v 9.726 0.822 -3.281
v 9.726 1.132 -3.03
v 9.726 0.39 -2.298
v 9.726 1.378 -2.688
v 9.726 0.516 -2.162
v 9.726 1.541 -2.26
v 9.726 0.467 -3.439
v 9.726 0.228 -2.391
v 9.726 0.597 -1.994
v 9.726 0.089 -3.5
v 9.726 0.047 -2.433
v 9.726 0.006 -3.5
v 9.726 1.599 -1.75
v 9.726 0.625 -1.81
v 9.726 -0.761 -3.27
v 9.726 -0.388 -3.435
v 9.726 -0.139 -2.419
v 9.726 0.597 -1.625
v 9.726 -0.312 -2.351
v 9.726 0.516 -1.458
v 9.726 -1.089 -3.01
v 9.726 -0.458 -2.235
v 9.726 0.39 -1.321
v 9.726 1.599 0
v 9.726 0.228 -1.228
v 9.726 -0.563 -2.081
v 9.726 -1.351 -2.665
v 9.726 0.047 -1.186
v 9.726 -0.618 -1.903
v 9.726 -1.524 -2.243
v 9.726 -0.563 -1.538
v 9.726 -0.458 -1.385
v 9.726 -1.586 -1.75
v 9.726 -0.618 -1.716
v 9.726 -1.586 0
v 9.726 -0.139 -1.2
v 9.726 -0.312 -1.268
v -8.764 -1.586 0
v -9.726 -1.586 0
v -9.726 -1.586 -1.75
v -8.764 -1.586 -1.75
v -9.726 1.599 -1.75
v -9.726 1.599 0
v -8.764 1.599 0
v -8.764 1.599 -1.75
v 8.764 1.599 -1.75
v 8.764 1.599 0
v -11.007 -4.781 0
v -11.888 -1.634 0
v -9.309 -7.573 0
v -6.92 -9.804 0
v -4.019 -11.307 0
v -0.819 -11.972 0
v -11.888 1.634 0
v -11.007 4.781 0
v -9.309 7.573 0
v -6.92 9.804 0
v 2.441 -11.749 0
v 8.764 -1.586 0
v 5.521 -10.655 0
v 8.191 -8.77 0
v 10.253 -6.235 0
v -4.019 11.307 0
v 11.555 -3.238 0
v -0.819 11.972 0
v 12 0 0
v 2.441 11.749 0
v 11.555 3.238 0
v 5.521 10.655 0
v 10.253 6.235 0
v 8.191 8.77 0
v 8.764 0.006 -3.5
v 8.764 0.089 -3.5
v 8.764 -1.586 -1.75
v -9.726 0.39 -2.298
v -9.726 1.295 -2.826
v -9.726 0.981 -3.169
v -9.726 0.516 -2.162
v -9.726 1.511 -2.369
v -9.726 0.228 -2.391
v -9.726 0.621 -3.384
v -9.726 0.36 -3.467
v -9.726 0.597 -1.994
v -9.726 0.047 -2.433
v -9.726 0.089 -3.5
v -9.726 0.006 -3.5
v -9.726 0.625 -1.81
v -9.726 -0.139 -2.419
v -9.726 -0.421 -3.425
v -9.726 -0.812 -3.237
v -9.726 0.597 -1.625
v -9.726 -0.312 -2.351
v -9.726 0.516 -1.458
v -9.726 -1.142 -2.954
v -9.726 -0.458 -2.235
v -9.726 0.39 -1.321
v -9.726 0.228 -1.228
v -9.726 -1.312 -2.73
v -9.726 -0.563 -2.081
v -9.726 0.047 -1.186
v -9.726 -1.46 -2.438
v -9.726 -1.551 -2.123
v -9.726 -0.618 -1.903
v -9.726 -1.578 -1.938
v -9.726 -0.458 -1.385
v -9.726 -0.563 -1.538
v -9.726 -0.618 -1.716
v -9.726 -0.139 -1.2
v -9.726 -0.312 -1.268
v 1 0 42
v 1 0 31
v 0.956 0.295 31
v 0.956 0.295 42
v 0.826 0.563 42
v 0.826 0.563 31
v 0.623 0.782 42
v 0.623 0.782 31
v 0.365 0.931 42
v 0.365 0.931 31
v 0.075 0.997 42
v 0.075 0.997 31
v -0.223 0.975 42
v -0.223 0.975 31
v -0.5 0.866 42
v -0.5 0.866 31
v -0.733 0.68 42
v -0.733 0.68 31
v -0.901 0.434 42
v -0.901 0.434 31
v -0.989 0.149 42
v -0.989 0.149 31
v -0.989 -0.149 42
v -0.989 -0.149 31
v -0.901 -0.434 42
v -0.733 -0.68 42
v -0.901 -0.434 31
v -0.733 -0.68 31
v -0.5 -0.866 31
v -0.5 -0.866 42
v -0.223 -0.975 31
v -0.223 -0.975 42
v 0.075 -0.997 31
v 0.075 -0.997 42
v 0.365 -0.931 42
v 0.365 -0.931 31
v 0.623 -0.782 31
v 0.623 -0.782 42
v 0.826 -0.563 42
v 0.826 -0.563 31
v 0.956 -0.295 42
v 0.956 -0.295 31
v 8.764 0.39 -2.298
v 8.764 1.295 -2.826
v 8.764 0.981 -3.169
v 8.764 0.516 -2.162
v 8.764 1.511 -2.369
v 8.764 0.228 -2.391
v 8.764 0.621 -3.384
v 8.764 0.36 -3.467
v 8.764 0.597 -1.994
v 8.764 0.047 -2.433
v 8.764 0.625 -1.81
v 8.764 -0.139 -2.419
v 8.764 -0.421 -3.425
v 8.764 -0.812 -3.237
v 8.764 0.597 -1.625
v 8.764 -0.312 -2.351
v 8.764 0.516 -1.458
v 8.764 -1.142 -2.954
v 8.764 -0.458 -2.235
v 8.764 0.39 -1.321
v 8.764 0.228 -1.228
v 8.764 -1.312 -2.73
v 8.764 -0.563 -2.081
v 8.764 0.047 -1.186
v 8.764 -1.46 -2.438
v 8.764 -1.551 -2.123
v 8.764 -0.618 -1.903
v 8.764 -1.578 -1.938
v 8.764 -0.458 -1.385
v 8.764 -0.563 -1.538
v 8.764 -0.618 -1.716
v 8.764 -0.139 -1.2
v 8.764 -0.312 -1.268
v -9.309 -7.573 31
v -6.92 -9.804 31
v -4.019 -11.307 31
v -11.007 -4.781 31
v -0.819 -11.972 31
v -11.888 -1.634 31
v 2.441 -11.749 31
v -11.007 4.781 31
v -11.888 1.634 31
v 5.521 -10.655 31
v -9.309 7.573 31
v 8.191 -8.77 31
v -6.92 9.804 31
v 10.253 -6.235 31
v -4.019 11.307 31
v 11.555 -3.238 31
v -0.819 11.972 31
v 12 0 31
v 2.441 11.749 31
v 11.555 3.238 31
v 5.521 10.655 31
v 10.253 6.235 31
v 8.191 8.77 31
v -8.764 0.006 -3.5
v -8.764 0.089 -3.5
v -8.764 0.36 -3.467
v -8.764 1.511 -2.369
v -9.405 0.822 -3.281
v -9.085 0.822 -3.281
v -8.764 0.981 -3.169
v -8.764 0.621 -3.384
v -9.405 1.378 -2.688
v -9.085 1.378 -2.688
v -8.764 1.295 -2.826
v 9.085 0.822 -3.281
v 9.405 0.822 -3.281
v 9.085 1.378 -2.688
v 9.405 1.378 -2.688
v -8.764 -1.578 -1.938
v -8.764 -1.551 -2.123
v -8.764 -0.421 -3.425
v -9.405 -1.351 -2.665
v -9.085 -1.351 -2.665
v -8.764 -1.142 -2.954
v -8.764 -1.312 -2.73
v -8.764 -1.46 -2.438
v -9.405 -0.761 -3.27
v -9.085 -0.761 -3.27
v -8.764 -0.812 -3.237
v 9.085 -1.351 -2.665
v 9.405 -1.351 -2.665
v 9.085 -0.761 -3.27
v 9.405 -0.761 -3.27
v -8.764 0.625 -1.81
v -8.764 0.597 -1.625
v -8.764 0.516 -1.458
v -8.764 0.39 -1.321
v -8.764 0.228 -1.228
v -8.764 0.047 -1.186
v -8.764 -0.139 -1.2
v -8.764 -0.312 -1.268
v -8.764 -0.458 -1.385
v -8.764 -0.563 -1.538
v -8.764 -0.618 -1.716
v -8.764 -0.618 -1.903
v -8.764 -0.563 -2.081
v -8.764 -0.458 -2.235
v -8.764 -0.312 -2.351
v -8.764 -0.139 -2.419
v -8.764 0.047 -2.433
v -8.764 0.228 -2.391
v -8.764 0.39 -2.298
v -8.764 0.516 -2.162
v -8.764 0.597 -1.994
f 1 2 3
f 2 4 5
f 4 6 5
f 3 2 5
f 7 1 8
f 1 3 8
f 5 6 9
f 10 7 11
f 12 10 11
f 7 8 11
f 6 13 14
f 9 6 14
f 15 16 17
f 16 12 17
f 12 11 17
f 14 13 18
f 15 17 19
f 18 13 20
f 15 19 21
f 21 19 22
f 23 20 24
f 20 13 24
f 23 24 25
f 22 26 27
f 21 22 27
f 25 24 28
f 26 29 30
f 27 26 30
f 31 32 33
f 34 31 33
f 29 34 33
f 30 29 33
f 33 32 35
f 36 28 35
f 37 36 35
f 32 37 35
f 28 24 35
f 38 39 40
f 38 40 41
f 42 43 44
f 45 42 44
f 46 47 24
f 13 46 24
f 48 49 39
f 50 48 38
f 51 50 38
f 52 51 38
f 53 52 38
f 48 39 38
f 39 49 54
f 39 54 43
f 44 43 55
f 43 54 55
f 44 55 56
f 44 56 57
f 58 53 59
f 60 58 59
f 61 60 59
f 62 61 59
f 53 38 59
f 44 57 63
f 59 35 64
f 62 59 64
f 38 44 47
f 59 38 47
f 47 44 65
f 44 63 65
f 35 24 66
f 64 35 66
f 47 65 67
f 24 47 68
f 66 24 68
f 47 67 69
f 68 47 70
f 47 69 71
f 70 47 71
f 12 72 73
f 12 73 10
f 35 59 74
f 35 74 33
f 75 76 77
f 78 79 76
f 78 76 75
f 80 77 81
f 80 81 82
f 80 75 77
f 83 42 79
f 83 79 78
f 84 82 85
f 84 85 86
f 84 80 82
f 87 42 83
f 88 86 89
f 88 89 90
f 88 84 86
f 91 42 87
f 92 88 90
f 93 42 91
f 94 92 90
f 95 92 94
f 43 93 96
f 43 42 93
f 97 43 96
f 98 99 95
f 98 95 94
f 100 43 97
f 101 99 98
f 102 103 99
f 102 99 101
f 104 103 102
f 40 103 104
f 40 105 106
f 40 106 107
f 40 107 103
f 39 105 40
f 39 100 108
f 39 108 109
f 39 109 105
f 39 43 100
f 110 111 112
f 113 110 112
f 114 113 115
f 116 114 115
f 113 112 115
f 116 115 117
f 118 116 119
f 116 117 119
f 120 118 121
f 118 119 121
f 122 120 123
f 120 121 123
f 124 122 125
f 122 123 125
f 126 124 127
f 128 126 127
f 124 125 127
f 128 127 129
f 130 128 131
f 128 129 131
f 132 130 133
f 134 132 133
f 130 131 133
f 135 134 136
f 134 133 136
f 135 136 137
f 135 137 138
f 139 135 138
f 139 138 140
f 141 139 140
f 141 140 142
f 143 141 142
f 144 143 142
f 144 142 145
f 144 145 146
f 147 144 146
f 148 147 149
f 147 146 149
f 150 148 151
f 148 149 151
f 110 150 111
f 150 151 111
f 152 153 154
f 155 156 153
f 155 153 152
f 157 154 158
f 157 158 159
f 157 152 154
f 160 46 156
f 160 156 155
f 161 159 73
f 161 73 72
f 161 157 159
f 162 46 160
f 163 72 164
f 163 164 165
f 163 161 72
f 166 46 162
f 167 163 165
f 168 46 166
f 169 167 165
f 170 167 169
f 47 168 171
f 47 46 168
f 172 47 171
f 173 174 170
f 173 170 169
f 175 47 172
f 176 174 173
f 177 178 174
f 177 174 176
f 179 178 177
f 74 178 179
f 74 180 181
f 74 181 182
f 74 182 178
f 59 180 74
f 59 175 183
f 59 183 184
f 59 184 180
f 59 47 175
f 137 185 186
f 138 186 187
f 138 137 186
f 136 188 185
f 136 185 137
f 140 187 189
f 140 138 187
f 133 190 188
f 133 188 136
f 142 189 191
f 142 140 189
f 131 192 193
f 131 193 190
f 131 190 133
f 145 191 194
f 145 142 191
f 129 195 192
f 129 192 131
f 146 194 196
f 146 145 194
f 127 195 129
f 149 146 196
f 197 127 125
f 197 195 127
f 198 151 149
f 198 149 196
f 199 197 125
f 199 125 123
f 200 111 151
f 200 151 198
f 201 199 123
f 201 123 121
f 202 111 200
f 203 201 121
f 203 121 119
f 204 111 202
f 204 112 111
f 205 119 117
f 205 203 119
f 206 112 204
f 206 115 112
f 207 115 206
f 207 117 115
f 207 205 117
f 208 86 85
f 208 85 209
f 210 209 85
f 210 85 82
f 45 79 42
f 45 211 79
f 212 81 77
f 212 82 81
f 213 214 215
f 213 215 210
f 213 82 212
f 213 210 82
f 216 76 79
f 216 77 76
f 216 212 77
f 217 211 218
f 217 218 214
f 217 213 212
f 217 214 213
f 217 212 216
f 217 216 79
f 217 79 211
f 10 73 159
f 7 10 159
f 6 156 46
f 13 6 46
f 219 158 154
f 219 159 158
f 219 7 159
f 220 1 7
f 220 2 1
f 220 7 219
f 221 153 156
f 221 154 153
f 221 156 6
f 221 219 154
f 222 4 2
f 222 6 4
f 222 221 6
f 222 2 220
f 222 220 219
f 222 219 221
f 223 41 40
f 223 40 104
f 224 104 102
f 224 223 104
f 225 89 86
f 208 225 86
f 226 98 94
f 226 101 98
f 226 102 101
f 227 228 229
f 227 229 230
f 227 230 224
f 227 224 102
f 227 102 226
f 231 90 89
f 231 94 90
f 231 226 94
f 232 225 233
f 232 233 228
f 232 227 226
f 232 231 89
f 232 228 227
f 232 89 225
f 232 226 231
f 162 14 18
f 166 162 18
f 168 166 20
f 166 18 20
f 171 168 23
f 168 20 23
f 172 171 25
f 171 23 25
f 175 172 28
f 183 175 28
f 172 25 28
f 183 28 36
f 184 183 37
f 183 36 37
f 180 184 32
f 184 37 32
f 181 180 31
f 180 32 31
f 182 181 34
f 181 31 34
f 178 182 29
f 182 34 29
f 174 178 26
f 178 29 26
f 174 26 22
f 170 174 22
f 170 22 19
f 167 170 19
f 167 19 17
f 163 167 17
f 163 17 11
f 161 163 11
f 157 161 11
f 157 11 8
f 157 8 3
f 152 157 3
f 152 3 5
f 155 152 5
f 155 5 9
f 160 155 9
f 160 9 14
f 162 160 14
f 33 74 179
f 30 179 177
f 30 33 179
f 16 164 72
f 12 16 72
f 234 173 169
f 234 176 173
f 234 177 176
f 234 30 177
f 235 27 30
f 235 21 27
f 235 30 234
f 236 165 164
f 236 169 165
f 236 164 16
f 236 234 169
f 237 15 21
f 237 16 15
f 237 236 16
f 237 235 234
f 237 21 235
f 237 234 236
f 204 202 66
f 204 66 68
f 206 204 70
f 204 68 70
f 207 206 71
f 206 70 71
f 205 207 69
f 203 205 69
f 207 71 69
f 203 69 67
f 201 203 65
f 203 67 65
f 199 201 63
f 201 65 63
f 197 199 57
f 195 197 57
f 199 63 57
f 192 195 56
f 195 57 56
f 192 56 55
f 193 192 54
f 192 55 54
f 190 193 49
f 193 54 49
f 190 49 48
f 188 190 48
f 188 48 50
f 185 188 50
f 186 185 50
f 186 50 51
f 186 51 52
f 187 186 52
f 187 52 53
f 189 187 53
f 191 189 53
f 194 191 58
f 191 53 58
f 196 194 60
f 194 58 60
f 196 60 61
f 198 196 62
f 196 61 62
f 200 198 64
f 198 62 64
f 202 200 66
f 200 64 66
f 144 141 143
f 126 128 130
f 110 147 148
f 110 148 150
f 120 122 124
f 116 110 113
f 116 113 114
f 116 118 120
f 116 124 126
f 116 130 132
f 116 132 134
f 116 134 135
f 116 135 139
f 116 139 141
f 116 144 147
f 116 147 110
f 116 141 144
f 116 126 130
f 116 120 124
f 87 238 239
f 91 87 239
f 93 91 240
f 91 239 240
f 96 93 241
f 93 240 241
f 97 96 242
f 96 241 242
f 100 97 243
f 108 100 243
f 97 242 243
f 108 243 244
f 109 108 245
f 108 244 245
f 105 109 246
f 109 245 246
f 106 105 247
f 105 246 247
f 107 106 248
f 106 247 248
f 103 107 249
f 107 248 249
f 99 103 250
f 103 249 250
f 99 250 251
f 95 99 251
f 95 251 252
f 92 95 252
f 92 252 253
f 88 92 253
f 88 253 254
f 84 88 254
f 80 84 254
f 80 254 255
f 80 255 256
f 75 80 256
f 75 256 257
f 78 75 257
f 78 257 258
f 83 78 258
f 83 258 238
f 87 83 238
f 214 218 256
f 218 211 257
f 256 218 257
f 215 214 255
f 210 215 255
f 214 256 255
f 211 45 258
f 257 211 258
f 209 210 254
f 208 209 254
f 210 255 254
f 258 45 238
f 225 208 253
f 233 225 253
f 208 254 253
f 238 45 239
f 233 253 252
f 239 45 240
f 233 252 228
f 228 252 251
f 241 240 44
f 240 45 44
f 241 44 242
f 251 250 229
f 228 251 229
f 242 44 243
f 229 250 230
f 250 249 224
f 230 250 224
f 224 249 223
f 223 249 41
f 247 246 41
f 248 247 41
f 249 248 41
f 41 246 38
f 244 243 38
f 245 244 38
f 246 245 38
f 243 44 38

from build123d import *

# Parameters (mm, degrees)
F0_R     = 12
F1_DEPTH = 31
F2_R     = 1
F3_DEPTH = 11
F4_W     = 0.961760059
F4_H     = 3.1858317088
F5_DEPTH = 3.5
F6_R     = 0.6249075308
F7_DEPTH = 21.7267718444


with BuildPart() as f1:
    # F0 (on Top) → F1 (new body)
    with BuildSketch(Plane.XY):
        Circle(F0_R)
    extrude(amount=F1_DEPTH)

    # F2 (on face) → F3 (join)
    with BuildSketch(Plane.XY.offset(31)):
        Circle(F2_R)
    extrude(amount=F3_DEPTH)

    # F4 (on face) → F5 (join)
    with BuildSketch(Plane(origin=(0, 0, 0), x_dir=(1, 0, 0), z_dir=(0, 0, -1))):
        with Locations((-9.2448918149, -0.0064170454)):
            Rectangle(F4_W, F4_H)
        with Locations((9.2448918149, -0.0064170454)):
            Rectangle(F4_W, F4_H)
    extrude(amount=F5_DEPTH)

    # F6 (on face) → F7 (cut, through all)
    with BuildSketch(Plane.YZ.offset(9.7257718444)):
        with BuildLine():
            add(Edge.make_bspline(
                [(0.0887662493, -3.5), (0.8568494058, -3.4783165811), (1.5993328998, -2.8509894263), (1.5993328998, -1.75)],
                knots=[0.5172392132, 0.5172392132, 0.5172392132, 0.5172392132, 1, 1, 1, 1], degree=3))
            Line((0.0887662493, -3.5), (1.5993328998, -3.5))
            Line((1.5993328998, -3.5), (1.5993328998, -1.75))
        make_face()
        with BuildLine():
            add(Edge.make_bspline(
                [(-1.586498809, -1.75), (-1.586498809, -2.800242044), (-0.7900408818, -3.4774841708), (0.0064170454, -3.5)],
                knots=[0, 0, 0, 0, 0.5, 0.5, 0.5, 0.5], degree=3))
            Line((-1.586498809, -1.75), (-1.586498809, -3.5))
            Line((-1.586498809, -3.5), (0.0064170454, -3.5))
        make_face()
        with Locations((0, -1.8095459091)):
            Circle(F6_R)
    extrude(amount=-F7_DEPTH, mode=Mode.SUBTRACT)


solid = f1.part
